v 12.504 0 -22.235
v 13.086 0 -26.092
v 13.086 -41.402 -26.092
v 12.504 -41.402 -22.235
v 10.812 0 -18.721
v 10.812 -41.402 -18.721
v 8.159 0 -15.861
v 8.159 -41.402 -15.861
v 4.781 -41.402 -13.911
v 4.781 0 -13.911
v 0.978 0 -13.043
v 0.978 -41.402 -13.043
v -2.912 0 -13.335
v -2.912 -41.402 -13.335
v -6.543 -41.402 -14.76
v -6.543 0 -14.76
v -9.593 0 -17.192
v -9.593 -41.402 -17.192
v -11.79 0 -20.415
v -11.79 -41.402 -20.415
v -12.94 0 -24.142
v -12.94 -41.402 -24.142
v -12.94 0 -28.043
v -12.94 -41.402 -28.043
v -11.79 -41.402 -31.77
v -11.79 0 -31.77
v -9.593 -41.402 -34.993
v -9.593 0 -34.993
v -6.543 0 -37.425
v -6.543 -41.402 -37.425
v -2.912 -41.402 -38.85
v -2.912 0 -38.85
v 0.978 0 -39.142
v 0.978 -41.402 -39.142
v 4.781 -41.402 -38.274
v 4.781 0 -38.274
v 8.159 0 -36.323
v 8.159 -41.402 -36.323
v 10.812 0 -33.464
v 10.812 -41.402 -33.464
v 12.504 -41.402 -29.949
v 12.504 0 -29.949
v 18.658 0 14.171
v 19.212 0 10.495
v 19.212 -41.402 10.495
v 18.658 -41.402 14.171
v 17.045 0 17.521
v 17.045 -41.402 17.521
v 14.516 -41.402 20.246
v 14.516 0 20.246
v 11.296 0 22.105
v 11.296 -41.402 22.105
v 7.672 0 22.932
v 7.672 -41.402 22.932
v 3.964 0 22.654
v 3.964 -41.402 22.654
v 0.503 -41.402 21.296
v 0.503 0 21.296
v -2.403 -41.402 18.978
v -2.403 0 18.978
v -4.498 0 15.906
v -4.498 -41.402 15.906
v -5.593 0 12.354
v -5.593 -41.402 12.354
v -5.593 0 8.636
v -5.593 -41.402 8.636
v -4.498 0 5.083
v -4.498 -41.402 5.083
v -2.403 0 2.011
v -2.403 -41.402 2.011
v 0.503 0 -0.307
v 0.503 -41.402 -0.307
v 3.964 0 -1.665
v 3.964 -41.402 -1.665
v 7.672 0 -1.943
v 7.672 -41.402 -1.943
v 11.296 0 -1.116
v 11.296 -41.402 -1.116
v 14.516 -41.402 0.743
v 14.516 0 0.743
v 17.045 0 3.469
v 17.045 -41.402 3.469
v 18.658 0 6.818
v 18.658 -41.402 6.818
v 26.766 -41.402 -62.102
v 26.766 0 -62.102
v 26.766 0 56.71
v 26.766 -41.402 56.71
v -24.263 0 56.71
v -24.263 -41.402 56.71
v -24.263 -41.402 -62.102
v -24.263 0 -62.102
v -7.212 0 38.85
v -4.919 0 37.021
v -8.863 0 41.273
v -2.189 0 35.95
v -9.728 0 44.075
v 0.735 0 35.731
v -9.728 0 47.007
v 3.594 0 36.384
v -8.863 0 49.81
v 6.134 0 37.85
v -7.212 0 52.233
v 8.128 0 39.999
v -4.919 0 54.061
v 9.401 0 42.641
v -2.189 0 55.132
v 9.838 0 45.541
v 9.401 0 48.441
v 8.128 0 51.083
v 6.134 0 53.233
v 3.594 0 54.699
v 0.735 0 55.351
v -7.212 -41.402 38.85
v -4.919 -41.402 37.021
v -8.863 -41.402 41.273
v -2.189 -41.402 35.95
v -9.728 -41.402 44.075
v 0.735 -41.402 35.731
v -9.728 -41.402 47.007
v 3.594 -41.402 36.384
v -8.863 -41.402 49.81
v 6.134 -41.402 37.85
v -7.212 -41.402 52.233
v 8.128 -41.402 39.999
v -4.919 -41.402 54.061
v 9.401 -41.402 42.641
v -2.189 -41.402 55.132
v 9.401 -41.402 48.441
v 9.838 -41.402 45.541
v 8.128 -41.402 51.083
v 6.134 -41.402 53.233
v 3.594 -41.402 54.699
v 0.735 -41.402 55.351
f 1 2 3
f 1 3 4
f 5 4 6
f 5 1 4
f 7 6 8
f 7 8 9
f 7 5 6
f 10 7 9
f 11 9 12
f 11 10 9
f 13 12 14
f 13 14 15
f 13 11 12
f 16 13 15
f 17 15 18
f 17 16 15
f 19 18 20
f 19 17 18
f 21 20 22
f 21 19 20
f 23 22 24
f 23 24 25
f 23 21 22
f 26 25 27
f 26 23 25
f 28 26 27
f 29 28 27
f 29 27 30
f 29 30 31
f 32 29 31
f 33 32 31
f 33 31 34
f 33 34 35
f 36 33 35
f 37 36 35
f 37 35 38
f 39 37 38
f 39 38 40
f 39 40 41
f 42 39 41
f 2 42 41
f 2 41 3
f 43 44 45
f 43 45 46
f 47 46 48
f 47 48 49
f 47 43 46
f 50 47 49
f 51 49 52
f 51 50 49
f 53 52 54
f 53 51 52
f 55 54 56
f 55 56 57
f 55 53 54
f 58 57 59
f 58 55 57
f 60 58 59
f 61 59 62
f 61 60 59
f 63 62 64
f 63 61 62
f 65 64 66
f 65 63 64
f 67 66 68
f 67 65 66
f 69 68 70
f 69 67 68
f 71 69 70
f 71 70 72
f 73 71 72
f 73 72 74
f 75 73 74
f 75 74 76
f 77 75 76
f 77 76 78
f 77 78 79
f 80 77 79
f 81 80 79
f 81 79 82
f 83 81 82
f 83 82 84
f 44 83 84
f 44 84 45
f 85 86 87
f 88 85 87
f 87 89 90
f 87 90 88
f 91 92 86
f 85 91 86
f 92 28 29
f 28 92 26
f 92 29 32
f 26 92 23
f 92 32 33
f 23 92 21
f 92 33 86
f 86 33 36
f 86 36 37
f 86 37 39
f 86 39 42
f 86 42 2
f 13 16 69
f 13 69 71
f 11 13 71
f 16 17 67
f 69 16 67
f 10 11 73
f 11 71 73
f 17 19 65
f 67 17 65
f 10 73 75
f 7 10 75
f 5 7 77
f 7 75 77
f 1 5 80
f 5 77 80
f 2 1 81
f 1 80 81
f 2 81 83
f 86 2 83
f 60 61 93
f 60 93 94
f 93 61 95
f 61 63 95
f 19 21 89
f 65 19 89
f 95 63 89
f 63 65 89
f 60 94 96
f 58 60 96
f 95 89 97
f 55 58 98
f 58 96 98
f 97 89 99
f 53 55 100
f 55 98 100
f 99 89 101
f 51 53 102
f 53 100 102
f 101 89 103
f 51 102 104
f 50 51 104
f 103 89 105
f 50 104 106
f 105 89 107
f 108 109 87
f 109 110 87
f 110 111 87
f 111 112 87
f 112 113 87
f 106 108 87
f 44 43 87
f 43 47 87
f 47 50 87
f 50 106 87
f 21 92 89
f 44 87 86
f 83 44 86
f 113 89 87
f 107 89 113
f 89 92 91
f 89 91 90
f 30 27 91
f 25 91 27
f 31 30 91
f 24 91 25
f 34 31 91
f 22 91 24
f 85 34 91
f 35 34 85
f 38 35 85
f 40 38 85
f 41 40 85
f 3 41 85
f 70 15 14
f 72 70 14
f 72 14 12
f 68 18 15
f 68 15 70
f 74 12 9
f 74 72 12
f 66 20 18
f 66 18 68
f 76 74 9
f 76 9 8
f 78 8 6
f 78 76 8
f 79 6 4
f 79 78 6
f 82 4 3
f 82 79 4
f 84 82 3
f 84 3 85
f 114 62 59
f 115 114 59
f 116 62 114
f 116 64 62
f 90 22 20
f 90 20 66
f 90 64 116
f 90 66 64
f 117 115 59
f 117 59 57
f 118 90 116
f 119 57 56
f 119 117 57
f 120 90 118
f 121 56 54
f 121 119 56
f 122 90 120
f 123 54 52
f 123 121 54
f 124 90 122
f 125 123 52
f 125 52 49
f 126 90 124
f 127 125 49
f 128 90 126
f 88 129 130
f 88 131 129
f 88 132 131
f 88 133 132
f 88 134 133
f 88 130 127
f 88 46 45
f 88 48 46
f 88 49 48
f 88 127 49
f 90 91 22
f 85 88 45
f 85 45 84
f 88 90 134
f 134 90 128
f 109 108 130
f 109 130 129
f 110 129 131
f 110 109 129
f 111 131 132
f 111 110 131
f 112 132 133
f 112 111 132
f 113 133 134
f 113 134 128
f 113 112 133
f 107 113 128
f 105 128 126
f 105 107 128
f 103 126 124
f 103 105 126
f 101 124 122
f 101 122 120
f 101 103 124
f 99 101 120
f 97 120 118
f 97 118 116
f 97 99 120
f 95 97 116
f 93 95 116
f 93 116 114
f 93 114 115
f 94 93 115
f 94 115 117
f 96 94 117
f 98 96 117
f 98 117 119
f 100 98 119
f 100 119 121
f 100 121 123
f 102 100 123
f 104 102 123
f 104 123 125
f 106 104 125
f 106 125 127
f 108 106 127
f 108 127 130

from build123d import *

# Parameters (mm, degrees)
F0_W     = 51.029243
F0_H     = 118.811481
F0_R     = 13.085796
F0_R_2   = 9.837697
F0_R_3   = 12.472461
F1_DEPTH = 41.402
F2_DEPTH = 25.4


with BuildPart() as f1:
    # F0 (on Front) → F1 (new body)
    with BuildSketch(Plane.XZ):
        with Locations((1.25166, -2.695885)):
            Rectangle(F0_W, F0_H)
        with Locations((0, -26.09231)):
            Circle(F0_R, mode=Mode.SUBTRACT)
        with Locations((0, 45.54119)):
            Circle(F0_R_2, mode=Mode.SUBTRACT)
        with Locations((6.739711, 10.494693)):
            Circle(F0_R_3, mode=Mode.SUBTRACT)
    extrude(amount=F1_DEPTH)

    # F0 (on Front) → F2 (join)
    with BuildSketch(Plane.XZ):
        with Locations((1.25166, -2.695885)):
            Rectangle(F0_W, F0_H)
        with Locations((0, -26.09231)):
            Circle(F0_R, mode=Mode.SUBTRACT)
        with Locations((0, 45.54119)):
            Circle(F0_R_2, mode=Mode.SUBTRACT)
        with Locations((6.739711, 10.494693)):
            Circle(F0_R_3, mode=Mode.SUBTRACT)
    extrude(amount=F2_DEPTH)


solid = f1.part
